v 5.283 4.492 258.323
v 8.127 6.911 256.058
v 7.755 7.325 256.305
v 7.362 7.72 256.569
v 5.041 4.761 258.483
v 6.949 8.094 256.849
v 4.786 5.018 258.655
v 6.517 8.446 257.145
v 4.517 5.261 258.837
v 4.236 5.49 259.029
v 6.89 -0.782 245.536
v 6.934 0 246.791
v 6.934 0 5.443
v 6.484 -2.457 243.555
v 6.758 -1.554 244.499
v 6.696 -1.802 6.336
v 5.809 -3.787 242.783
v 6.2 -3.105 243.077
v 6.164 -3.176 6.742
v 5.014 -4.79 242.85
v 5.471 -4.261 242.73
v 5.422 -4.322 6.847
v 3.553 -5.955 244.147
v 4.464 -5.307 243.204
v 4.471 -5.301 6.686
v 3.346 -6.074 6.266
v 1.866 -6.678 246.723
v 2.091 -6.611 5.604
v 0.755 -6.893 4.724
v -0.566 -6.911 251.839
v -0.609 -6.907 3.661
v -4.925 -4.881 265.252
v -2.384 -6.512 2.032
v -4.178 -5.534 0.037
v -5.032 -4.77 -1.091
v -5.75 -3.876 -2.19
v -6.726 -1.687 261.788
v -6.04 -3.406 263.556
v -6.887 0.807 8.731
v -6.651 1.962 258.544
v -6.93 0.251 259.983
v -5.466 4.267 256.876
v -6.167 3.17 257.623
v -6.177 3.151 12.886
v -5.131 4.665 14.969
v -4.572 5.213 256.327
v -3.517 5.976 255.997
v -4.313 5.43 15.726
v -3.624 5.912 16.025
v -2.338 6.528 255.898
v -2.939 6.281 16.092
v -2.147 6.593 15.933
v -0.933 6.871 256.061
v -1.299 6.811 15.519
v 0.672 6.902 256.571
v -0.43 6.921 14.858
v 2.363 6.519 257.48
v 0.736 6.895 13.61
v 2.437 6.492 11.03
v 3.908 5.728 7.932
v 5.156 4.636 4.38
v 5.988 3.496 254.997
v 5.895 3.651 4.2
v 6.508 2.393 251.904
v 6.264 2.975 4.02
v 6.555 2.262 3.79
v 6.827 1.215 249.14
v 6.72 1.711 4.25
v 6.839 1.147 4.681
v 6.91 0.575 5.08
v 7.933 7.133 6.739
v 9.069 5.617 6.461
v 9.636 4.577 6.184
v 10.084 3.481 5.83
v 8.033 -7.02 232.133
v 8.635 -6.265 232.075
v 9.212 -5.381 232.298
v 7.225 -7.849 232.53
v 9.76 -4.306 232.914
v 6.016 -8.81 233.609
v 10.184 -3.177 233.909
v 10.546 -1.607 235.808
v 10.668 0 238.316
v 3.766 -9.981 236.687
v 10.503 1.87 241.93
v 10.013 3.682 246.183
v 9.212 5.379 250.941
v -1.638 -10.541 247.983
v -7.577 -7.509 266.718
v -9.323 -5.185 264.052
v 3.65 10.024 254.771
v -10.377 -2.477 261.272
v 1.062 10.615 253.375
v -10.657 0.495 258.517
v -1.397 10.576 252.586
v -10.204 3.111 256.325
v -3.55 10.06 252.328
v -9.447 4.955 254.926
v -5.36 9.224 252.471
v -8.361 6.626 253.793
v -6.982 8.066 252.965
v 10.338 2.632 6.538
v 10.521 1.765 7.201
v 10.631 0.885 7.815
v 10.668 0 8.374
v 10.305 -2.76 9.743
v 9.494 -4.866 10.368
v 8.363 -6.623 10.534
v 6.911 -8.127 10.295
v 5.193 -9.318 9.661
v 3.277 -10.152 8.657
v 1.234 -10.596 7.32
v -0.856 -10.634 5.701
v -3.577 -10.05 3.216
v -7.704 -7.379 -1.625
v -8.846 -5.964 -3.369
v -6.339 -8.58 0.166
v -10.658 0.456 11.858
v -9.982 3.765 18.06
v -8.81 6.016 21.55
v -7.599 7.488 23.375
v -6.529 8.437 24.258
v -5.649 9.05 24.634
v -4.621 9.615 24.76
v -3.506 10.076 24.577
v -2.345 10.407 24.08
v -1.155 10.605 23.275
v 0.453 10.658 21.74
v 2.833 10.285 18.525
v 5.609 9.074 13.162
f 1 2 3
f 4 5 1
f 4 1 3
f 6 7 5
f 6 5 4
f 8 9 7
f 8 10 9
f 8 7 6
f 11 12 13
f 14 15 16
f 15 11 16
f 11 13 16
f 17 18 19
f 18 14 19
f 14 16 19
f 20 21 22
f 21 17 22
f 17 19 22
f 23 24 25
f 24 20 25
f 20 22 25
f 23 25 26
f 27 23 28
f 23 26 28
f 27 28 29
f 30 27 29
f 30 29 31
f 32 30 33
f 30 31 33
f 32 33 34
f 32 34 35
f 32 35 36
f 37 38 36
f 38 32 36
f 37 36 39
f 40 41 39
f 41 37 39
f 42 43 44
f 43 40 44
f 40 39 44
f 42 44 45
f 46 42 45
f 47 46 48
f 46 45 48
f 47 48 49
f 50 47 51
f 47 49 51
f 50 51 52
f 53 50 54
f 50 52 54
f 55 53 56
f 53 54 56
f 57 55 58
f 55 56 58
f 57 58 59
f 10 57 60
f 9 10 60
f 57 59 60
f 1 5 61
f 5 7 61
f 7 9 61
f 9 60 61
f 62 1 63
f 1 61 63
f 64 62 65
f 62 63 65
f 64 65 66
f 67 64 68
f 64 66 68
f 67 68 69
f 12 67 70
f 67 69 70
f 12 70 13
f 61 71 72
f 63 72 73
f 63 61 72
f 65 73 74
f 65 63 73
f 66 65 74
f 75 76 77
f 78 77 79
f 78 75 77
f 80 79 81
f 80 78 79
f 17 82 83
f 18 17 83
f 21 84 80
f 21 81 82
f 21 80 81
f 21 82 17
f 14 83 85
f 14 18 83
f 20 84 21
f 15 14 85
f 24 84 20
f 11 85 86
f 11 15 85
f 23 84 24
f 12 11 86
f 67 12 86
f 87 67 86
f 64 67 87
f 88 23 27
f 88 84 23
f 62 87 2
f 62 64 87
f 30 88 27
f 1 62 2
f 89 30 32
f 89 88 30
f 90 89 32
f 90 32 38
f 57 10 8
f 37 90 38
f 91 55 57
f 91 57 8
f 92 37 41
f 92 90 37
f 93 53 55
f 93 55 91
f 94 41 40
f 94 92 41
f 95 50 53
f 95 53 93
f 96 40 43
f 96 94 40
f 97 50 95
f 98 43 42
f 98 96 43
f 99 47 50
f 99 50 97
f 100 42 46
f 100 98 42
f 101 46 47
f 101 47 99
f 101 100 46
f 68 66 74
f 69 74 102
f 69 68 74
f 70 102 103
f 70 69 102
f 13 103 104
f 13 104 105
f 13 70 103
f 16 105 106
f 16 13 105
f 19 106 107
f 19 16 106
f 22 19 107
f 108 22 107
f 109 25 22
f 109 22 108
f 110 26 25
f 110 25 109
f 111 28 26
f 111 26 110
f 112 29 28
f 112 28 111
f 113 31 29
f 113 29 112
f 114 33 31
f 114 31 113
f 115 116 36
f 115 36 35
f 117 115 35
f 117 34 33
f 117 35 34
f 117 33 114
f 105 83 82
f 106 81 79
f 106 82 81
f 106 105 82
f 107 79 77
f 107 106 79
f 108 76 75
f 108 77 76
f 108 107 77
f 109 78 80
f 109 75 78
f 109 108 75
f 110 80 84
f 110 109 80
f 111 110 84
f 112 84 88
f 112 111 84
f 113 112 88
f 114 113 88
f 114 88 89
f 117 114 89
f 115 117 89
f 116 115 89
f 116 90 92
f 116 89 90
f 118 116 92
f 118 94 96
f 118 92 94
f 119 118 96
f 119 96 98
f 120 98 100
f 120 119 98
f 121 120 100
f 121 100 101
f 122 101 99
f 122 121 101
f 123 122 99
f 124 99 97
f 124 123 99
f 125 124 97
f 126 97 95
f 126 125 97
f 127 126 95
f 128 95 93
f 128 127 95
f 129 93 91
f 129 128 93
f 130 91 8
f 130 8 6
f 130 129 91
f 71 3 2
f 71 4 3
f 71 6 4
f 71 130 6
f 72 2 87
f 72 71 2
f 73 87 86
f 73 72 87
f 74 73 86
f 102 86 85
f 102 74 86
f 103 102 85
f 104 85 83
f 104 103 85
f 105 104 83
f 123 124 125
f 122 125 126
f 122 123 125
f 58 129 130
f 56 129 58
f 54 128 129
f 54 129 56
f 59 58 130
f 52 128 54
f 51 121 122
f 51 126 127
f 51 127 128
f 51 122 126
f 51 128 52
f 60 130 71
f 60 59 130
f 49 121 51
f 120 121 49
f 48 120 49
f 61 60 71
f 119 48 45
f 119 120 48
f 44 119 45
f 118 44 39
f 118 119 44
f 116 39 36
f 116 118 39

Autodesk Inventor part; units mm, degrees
ref_plane "Start Plane" through (0, 0, -3.37) normal (0, 0, 1) x (1, 0, 0)
ref_plane "End Plane" through (0, 0, 266.7183) normal (0, 0, 1) x (1, 0, 0)
sketch "Sketch" plane through (0, 0, 0) normal (0, 0, 1) x (1, 0, 0)
  circle A0 centre (0, 0) radius 6.9342
  circle A1 centre (0, 0) radius 10.668
  dimension "d0" = 21.336
  dimension "d1" = 3.7338
extrude "Body" add sketch "Sketch" along normal up to surface (270.0883 mm away) from surface at -3.37
sketch "Sketch3" plane through (0, 0, 0) normal (0, 0, 1) x (1, 0, 0)
  line L0 (0, 0) -> (10, 0)
ref_plane "Work Plane3" through (0, 0, 0) normal (0, -1, 0) x (1, 0, 0)
sketch "Sketch4" plane through (0, 0, 0) normal (0, -1, 0) x (1, 0, 0)
  line L0 (-2, -3.37) -> (12, -3.37)
  line L1 (-2, 266.7183) -> (12, 266.7183)
  dimension "d7" = 270.0883
ref_plane "Work Plane4" through (-6.8383, -8.1881, -6.8069) normal (0.3448, 0.4129, -0.843) x (0.2427, -0.9068, -0.3448)
split "Split1" plane through (-6.8383, -8.1881, -6.8069) removes the side toward (0.3448, 0.4129, -0.843)
ref_plane "Work Plane5" through (4.7044, -9.5747, -24.7602) normal (-0.405, 0.8243, -0.3957) x (0.7286, 0.5524, 0.405)
split "Split2" plane through (4.7044, -9.5747, -24.7602) removes the side toward (-0.405, 0.8243, -0.3957)
ref_plane "Work Plane6" through (-8.4798, 6.473, -10.5353) normal (0.5585, -0.4264, -0.7115) x (-0.0814, 0.8255, -0.5585)
split "Split3" plane through (-8.4798, 6.473, -10.5353) removes the side toward (0.5585, -0.4264, -0.7115)
ref_plane "Work Plane7" through (3.7346, -9.993, 272.7308) normal (-0.242, 0.6474, 0.7227) x (0.966, 0.0909, 0.242)
split "Split4" plane through (3.7346, -9.993, 272.7308) removes the side toward (-0.242, 0.6474, 0.7227)
ref_plane "Work Plane8" through (-8.4798, 6.473, 292.9957) normal (0.7502, -0.5727, 0.3305) x (0.577, 0.3229, -0.7502)
split "Split5" plane through (-8.4798, 6.473, 292.9957) removes the side toward (0.7502, -0.5727, 0.3305)
ref_plane "Work Plane9" through (-10.6242, -0.9653, 270.4444) normal (0.5935, 0.0539, 0.8031) x (0.8047, -0.0177, -0.5935)
split "Split6" plane through (-10.6242, -0.9653, 270.4444) removes the side toward (0.5935, 0.0539, 0.8031)
equation "\"d0\" = G_H"
equation "\"d1\" = G_T"
equation "\"d2\" = G_L"
equation "\"G_H\" = 21.336"
equation "\"G_T\" = 3.7338"
equation "\"G_L\" = 270.08826"
equation "\"G_OFFSET_START\" = 3.36995"
equation "\"G_OFFSET_END\" = 4.18997"
equation "\"d4\" = -G_OFFSET_START"
equation "\"d5\" = G_OFFSET_END + B_L"
equation "\"B_L\" = 262.52833"
properties part number "ANSI - 1/2 x 0.147 - 10.633" material "Steel, Mild"
